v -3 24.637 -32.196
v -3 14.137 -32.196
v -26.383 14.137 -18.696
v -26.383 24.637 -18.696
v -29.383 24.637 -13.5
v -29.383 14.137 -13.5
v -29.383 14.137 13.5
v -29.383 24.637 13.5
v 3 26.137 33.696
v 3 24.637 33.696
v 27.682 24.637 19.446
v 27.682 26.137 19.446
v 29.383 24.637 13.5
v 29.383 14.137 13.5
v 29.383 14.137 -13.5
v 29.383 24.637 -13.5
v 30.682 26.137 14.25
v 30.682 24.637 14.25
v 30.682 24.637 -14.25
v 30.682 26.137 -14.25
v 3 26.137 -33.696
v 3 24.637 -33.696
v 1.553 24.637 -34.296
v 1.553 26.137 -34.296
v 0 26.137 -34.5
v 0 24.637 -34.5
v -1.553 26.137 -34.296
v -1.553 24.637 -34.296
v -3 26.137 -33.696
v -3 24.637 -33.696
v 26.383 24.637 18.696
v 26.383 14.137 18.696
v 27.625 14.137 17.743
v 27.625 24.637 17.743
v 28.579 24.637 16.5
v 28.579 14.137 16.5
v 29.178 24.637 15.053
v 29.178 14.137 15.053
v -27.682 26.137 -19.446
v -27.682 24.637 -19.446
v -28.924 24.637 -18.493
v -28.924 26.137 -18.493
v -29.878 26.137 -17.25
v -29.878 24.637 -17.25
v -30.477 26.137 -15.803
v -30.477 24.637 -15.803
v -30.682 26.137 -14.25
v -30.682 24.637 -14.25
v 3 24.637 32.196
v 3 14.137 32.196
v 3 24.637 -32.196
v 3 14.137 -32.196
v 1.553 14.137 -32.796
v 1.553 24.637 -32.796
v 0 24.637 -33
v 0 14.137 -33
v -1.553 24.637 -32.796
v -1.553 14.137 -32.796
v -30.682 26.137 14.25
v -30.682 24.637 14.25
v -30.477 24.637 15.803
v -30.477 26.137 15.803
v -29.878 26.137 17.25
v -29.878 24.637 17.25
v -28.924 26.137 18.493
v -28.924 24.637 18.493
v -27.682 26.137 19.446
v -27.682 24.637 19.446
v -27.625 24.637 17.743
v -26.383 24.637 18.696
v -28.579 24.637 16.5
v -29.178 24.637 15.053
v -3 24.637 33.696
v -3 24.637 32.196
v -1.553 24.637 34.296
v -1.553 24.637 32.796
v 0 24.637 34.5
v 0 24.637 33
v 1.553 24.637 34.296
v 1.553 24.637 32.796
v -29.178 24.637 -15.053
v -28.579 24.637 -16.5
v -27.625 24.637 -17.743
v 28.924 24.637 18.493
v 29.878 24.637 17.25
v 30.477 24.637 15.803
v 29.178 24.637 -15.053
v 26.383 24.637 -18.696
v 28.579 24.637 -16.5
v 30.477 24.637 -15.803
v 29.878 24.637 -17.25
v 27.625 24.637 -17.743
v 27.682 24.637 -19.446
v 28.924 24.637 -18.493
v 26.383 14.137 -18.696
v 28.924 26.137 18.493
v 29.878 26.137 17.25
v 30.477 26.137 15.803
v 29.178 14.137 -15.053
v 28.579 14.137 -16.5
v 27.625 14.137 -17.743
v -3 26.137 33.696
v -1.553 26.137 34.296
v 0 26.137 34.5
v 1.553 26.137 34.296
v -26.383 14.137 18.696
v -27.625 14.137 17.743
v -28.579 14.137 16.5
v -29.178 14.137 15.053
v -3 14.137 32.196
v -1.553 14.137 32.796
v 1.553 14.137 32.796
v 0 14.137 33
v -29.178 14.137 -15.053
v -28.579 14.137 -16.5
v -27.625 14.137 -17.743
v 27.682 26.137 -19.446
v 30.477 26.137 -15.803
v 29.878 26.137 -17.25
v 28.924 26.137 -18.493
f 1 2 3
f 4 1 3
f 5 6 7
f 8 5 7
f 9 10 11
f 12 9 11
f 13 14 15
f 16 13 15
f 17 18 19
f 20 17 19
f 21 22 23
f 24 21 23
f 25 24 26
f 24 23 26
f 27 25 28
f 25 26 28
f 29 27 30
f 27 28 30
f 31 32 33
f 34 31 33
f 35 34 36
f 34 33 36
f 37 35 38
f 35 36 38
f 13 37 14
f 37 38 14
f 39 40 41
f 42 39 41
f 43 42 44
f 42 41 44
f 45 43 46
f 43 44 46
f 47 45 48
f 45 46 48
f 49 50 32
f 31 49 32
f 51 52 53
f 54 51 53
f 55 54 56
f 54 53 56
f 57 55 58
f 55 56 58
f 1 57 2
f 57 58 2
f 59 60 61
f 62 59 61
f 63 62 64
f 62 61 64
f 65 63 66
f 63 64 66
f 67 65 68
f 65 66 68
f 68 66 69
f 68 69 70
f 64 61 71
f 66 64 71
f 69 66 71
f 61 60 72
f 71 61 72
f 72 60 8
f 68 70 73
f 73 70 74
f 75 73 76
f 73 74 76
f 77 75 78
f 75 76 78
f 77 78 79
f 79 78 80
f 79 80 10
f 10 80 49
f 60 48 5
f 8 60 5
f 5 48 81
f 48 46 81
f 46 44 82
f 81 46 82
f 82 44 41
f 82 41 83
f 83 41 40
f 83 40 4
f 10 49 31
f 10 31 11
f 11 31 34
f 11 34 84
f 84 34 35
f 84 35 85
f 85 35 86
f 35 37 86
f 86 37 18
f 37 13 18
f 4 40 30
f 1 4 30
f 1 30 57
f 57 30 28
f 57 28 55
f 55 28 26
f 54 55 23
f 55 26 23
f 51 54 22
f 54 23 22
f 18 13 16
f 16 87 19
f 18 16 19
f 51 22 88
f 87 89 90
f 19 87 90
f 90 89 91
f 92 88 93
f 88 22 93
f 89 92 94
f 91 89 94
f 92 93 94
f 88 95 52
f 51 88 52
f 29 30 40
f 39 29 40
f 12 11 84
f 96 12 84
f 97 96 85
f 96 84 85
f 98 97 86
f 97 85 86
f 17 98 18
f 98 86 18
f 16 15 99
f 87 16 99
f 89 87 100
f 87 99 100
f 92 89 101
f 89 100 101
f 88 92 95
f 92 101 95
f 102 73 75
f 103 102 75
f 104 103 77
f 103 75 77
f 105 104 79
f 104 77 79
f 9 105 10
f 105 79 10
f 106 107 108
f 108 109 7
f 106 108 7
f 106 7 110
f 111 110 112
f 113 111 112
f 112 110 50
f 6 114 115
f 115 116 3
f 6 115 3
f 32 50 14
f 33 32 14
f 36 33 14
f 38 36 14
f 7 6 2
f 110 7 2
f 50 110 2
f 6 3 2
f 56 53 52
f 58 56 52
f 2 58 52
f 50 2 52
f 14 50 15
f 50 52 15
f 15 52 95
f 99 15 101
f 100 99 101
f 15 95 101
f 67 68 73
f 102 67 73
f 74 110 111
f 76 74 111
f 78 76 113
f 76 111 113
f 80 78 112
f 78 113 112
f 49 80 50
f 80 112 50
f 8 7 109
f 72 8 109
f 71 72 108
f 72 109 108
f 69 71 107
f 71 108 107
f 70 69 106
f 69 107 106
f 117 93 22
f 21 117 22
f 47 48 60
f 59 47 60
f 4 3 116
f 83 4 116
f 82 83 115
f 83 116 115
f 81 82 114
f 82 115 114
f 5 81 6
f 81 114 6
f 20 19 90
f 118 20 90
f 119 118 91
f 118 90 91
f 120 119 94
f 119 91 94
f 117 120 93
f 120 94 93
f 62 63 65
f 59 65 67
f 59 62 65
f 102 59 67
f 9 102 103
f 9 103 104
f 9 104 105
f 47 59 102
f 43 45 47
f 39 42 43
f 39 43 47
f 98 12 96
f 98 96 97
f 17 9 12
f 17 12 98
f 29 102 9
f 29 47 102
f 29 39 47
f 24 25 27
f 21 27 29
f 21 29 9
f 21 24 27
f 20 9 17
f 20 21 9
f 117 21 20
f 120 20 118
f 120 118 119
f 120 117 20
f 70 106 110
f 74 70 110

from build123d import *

# Parameters (mm, degrees)
BOSS_EXTRUDE2_DEPTH = 35
BOSS_EXTRUDE3_DEPTH = 5
SCALE1_SCALE        = 0.3


with BuildPart() as part:
    # Sketch2 → Boss-Extrude2 (new body)
    with BuildSketch(Plane(origin=(0, 0, 0), x_dir=(1, 0, 0), z_dir=(0, 1, 0))):
        with BuildLine():
            Line((-10, 107.320508076), (-87.942286341, 62.320508076))
            ThreePointArc((-87.942286341, 62.320508076), (-95.262794416, 55), (-97.942286341, 45))
            Line((-97.942286341, 45), (-97.942286341, -45))
            ThreePointArc((-97.942286341, -45), (-95.262794416, -55), (-87.942286341, -62.320508076))
            Line((-87.942286341, -62.320508076), (-10, -107.320508076))
            ThreePointArc((-10, -107.320508076), (0, -110), (10, -107.320508076))
            Line((10, -107.320508076), (87.942286341, -62.320508076))
            ThreePointArc((87.942286341, -62.320508076), (95.262794416, -55), (97.942286341, -45))
            Line((97.942286341, -45), (97.942286341, 45))
            ThreePointArc((97.942286341, 45), (95.262794416, 55), (87.942286341, 62.320508076))
            Line((87.942286341, 62.320508076), (10, 107.320508076))
            ThreePointArc((10, 107.320508076), (0, 110), (-10, 107.320508076))
        make_face()
    extrude(amount=BOSS_EXTRUDE2_DEPTH)

    # Sketch5 → Boss-Extrude3 (add)
    with BuildSketch(Plane(origin=(0, 35, 0), x_dir=(1, 0, 0), z_dir=(0, 1, 0))):
        with BuildLine():
            Line((-10, 112.320508076), (-92.27241336, 64.820508076))
            ThreePointArc((-92.27241336, 64.820508076), (-99.592921435, 57.5), (-102.27241336, 47.5))
            Line((-102.27241336, 47.5), (-102.27241336, -47.5))
            ThreePointArc((-102.27241336, -47.5), (-99.592921435, -57.5), (-92.27241336, -64.820508076))
            Line((-92.27241336, -64.820508076), (-10, -112.320508076))
            ThreePointArc((-10, -112.320508076), (0, -115), (10, -112.320508076))
            Line((10, -112.320508076), (92.27241336, -64.820508076))
            ThreePointArc((92.27241336, -64.820508076), (99.592921435, -57.5), (102.27241336, -47.5))
            Line((102.27241336, -47.5), (102.27241336, 47.5))
            ThreePointArc((102.27241336, 47.5), (99.592921435, 57.5), (92.27241336, 64.820508076))
            Line((92.27241336, 64.820508076), (10, 112.320508076))
            ThreePointArc((10, 112.320508076), (0, 115), (-10, 112.320508076))
        make_face()
    extrude(amount=BOSS_EXTRUDE3_DEPTH)


with BuildPart() as part_1:
    # Scale1: scaled about (0, 20.196243732, 0)
    add(part.part.scale(SCALE1_SCALE).moved(Location((0, 14.137370612, 0))))


solid = part_1.part
